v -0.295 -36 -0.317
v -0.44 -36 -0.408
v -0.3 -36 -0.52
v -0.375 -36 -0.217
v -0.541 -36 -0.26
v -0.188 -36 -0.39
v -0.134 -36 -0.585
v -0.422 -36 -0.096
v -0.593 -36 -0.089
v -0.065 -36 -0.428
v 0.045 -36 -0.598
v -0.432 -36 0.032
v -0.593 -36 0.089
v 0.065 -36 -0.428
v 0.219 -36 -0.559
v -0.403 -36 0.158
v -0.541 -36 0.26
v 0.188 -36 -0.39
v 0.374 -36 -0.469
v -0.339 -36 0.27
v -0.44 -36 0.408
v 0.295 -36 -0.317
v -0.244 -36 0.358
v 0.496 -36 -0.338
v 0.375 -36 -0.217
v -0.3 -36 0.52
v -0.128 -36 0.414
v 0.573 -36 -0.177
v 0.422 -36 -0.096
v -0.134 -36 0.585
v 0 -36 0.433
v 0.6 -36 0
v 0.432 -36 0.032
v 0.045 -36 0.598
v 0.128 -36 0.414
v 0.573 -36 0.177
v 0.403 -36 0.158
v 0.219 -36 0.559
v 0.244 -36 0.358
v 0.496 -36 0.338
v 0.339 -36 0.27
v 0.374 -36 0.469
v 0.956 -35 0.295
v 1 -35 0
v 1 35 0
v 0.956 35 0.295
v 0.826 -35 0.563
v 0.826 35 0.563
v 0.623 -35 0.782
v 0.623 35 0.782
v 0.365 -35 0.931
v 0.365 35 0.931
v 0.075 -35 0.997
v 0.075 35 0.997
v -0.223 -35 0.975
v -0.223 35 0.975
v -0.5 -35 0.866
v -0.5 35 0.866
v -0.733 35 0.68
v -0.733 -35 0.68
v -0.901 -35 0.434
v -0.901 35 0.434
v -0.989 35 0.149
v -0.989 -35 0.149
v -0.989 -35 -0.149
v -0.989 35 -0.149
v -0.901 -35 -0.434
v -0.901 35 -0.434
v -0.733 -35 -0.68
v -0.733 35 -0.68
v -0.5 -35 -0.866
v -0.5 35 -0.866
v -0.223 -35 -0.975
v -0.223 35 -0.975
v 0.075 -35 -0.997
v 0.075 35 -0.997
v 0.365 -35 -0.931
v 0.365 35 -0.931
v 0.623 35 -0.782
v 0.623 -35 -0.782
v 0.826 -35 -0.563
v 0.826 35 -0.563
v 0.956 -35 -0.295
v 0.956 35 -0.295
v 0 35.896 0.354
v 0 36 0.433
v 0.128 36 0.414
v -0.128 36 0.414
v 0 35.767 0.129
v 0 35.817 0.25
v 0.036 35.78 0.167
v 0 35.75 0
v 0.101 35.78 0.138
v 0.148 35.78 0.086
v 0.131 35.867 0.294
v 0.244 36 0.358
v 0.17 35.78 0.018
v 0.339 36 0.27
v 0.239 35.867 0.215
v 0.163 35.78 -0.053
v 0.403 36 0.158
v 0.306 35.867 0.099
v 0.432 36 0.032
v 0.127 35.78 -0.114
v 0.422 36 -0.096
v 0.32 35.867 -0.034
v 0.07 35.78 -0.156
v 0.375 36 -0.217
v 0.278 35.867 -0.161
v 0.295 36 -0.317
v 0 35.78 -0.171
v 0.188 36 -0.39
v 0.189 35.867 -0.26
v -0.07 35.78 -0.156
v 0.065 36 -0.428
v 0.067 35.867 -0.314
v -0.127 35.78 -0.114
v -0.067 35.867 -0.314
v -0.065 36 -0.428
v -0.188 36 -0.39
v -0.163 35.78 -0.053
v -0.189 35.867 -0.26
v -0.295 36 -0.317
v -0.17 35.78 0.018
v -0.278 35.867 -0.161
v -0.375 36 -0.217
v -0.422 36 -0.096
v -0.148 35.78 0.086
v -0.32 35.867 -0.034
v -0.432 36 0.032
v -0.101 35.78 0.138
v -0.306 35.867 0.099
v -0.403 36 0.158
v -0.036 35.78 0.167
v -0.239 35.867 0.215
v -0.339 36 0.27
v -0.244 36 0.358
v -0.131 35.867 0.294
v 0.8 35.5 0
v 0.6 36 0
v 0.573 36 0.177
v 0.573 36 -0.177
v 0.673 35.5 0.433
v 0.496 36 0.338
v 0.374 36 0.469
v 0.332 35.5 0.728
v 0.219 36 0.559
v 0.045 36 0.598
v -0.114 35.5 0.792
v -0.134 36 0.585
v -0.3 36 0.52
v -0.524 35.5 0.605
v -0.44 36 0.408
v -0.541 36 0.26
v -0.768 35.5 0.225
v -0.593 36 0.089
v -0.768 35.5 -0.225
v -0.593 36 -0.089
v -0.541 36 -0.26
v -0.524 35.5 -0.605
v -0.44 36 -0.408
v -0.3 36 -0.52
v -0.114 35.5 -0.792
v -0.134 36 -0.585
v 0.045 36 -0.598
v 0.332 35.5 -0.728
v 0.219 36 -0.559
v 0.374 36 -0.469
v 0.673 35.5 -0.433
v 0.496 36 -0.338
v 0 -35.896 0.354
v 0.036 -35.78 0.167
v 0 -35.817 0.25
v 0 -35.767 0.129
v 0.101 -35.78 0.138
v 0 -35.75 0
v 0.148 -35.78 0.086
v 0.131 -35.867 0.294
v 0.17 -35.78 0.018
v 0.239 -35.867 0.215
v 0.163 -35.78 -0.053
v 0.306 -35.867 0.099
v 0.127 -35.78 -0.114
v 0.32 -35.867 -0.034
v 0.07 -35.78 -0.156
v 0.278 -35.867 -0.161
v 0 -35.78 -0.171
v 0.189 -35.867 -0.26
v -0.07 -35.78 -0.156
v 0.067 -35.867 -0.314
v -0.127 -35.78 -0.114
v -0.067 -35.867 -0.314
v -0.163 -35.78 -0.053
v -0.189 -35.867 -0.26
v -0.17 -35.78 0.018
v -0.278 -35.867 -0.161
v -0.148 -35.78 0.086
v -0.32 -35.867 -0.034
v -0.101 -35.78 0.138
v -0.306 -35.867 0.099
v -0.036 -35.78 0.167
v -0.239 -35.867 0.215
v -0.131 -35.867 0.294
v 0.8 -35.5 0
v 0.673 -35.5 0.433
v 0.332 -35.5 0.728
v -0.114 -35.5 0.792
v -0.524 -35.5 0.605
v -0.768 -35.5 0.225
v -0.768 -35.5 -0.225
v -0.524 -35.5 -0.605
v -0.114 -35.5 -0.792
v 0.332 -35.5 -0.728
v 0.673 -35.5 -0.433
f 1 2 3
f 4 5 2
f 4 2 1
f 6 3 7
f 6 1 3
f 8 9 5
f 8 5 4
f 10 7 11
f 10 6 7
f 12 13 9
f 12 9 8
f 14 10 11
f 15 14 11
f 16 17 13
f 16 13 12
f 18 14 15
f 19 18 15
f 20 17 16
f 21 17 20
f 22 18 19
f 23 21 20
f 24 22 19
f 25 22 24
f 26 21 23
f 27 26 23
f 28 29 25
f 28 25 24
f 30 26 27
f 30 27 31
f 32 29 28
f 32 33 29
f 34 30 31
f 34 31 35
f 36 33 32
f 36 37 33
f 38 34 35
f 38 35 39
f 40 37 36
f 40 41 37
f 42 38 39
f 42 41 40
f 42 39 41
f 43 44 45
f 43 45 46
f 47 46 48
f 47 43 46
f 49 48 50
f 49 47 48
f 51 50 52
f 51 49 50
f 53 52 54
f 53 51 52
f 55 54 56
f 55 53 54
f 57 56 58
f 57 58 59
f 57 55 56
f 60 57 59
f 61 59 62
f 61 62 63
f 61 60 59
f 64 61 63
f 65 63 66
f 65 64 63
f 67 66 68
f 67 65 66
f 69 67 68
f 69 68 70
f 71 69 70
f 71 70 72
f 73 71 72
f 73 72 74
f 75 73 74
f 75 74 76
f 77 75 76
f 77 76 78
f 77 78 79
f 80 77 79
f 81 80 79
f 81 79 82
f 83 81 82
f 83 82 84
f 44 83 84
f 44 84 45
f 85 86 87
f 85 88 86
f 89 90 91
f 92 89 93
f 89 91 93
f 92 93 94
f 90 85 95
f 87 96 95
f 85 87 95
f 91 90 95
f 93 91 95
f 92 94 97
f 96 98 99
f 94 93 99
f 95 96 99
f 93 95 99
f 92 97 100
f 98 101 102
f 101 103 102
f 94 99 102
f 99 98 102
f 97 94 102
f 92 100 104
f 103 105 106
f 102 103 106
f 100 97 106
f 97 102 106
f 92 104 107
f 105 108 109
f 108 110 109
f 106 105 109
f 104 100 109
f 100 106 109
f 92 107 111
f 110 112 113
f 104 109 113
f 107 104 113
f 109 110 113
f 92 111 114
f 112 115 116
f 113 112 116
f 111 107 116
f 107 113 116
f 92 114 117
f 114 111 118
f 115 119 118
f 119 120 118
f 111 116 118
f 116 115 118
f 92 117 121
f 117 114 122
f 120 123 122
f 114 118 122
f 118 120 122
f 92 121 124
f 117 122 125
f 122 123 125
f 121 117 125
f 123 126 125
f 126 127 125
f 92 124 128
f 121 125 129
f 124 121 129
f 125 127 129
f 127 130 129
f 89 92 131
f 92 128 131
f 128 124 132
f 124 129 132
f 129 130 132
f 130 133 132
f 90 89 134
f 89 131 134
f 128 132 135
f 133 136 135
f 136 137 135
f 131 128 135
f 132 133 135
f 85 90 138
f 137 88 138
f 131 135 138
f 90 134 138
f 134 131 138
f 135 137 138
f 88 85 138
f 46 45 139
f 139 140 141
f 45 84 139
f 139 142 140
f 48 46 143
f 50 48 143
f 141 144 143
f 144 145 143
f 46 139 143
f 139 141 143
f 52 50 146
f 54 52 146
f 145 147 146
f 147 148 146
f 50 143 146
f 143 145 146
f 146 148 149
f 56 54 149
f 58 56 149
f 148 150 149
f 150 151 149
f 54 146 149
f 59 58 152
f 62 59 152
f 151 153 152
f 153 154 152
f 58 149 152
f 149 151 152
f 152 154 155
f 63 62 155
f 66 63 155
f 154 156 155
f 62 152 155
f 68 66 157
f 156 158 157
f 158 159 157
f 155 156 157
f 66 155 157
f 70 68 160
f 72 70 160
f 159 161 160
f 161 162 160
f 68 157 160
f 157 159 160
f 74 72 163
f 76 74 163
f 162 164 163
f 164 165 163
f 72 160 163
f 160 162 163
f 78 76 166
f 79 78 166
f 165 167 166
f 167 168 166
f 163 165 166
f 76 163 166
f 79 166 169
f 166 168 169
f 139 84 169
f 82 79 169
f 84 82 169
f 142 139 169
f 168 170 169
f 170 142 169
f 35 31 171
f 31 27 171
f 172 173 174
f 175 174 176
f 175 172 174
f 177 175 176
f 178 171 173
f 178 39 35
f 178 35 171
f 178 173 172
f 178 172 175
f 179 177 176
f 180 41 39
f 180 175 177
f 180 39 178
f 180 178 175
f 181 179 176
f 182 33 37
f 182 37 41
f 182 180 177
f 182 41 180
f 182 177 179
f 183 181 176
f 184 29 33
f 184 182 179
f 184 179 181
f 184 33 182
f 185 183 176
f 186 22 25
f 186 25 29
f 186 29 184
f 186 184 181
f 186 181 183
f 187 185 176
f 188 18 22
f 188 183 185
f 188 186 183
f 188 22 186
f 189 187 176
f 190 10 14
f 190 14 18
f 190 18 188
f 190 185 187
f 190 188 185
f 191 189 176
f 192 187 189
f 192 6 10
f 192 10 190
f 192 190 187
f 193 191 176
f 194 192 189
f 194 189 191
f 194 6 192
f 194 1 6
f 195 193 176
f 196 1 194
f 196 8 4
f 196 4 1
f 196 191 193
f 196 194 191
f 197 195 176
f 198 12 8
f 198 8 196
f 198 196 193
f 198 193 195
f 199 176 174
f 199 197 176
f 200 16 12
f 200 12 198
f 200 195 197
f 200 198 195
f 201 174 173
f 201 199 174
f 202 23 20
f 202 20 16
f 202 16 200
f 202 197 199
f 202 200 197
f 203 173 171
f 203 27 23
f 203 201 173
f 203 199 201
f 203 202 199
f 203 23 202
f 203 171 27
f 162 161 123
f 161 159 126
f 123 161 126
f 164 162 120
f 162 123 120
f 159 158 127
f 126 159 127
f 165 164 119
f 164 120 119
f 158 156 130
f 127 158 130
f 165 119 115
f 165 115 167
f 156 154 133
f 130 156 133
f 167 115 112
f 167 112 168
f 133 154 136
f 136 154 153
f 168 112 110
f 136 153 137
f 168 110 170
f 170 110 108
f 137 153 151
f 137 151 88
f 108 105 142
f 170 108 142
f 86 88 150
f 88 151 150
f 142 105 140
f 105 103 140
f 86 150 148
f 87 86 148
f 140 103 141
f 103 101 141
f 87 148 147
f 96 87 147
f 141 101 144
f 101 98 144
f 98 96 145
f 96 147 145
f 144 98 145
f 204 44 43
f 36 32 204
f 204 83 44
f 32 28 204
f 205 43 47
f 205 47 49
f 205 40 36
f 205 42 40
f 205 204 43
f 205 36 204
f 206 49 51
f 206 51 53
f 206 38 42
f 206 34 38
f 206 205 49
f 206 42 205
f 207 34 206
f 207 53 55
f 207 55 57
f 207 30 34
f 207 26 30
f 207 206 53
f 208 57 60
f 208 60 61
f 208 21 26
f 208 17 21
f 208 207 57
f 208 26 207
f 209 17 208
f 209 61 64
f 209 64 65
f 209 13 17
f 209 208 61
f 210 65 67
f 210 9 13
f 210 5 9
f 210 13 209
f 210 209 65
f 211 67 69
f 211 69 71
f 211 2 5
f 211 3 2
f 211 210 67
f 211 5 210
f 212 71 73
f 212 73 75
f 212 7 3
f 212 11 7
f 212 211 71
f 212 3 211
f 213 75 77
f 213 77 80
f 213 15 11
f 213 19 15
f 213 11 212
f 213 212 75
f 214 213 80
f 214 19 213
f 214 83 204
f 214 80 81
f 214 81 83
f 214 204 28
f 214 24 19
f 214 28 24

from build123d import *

# Parameters (mm, degrees)
SKETCH_R      = 1
PAD_DEPTH     = 36
CHAMFER_SIZE2 = 0.4
CHAMFER_SIZE  = 1


with BuildPart() as part:
    # Sketch → Pad (new body, symmetric)
    with BuildSketch(Plane.XZ):
        Circle(SKETCH_R)
    extrude(amount=PAD_DEPTH, both=True)

    # Chamfer
    chamfer_edges = [part.edges().sort_by_distance(p)[0] for p in [
        (-1, -36, 0),
        (-1, 36, 0),
    ]]
    chamfer_side = part.faces().sort_by_distance((-1, 0, 0))[0]
    chamfer(chamfer_edges, length=CHAMFER_SIZE, length2=CHAMFER_SIZE2, reference=chamfer_side)

    # Sketch002 (on YZ_Plane of Origin) → Groove (revolve, cut)
    with BuildSketch(Plane.YZ):
        with BuildLine():
            ThreePointArc((-35.75, 0), (-36.25, 0.5), (-36.75, 0))
            Line((-36.75, 0), (-35.75, 0))
        make_face()
    groove = revolve(axis=Axis((0, 0, 0), (0, 1, 0)), mode=Mode.SUBTRACT)

    # Mirrored: Groove across XZ
    add(groove.mirror(Plane.XZ), mode=Mode.SUBTRACT)


solid = part.part
